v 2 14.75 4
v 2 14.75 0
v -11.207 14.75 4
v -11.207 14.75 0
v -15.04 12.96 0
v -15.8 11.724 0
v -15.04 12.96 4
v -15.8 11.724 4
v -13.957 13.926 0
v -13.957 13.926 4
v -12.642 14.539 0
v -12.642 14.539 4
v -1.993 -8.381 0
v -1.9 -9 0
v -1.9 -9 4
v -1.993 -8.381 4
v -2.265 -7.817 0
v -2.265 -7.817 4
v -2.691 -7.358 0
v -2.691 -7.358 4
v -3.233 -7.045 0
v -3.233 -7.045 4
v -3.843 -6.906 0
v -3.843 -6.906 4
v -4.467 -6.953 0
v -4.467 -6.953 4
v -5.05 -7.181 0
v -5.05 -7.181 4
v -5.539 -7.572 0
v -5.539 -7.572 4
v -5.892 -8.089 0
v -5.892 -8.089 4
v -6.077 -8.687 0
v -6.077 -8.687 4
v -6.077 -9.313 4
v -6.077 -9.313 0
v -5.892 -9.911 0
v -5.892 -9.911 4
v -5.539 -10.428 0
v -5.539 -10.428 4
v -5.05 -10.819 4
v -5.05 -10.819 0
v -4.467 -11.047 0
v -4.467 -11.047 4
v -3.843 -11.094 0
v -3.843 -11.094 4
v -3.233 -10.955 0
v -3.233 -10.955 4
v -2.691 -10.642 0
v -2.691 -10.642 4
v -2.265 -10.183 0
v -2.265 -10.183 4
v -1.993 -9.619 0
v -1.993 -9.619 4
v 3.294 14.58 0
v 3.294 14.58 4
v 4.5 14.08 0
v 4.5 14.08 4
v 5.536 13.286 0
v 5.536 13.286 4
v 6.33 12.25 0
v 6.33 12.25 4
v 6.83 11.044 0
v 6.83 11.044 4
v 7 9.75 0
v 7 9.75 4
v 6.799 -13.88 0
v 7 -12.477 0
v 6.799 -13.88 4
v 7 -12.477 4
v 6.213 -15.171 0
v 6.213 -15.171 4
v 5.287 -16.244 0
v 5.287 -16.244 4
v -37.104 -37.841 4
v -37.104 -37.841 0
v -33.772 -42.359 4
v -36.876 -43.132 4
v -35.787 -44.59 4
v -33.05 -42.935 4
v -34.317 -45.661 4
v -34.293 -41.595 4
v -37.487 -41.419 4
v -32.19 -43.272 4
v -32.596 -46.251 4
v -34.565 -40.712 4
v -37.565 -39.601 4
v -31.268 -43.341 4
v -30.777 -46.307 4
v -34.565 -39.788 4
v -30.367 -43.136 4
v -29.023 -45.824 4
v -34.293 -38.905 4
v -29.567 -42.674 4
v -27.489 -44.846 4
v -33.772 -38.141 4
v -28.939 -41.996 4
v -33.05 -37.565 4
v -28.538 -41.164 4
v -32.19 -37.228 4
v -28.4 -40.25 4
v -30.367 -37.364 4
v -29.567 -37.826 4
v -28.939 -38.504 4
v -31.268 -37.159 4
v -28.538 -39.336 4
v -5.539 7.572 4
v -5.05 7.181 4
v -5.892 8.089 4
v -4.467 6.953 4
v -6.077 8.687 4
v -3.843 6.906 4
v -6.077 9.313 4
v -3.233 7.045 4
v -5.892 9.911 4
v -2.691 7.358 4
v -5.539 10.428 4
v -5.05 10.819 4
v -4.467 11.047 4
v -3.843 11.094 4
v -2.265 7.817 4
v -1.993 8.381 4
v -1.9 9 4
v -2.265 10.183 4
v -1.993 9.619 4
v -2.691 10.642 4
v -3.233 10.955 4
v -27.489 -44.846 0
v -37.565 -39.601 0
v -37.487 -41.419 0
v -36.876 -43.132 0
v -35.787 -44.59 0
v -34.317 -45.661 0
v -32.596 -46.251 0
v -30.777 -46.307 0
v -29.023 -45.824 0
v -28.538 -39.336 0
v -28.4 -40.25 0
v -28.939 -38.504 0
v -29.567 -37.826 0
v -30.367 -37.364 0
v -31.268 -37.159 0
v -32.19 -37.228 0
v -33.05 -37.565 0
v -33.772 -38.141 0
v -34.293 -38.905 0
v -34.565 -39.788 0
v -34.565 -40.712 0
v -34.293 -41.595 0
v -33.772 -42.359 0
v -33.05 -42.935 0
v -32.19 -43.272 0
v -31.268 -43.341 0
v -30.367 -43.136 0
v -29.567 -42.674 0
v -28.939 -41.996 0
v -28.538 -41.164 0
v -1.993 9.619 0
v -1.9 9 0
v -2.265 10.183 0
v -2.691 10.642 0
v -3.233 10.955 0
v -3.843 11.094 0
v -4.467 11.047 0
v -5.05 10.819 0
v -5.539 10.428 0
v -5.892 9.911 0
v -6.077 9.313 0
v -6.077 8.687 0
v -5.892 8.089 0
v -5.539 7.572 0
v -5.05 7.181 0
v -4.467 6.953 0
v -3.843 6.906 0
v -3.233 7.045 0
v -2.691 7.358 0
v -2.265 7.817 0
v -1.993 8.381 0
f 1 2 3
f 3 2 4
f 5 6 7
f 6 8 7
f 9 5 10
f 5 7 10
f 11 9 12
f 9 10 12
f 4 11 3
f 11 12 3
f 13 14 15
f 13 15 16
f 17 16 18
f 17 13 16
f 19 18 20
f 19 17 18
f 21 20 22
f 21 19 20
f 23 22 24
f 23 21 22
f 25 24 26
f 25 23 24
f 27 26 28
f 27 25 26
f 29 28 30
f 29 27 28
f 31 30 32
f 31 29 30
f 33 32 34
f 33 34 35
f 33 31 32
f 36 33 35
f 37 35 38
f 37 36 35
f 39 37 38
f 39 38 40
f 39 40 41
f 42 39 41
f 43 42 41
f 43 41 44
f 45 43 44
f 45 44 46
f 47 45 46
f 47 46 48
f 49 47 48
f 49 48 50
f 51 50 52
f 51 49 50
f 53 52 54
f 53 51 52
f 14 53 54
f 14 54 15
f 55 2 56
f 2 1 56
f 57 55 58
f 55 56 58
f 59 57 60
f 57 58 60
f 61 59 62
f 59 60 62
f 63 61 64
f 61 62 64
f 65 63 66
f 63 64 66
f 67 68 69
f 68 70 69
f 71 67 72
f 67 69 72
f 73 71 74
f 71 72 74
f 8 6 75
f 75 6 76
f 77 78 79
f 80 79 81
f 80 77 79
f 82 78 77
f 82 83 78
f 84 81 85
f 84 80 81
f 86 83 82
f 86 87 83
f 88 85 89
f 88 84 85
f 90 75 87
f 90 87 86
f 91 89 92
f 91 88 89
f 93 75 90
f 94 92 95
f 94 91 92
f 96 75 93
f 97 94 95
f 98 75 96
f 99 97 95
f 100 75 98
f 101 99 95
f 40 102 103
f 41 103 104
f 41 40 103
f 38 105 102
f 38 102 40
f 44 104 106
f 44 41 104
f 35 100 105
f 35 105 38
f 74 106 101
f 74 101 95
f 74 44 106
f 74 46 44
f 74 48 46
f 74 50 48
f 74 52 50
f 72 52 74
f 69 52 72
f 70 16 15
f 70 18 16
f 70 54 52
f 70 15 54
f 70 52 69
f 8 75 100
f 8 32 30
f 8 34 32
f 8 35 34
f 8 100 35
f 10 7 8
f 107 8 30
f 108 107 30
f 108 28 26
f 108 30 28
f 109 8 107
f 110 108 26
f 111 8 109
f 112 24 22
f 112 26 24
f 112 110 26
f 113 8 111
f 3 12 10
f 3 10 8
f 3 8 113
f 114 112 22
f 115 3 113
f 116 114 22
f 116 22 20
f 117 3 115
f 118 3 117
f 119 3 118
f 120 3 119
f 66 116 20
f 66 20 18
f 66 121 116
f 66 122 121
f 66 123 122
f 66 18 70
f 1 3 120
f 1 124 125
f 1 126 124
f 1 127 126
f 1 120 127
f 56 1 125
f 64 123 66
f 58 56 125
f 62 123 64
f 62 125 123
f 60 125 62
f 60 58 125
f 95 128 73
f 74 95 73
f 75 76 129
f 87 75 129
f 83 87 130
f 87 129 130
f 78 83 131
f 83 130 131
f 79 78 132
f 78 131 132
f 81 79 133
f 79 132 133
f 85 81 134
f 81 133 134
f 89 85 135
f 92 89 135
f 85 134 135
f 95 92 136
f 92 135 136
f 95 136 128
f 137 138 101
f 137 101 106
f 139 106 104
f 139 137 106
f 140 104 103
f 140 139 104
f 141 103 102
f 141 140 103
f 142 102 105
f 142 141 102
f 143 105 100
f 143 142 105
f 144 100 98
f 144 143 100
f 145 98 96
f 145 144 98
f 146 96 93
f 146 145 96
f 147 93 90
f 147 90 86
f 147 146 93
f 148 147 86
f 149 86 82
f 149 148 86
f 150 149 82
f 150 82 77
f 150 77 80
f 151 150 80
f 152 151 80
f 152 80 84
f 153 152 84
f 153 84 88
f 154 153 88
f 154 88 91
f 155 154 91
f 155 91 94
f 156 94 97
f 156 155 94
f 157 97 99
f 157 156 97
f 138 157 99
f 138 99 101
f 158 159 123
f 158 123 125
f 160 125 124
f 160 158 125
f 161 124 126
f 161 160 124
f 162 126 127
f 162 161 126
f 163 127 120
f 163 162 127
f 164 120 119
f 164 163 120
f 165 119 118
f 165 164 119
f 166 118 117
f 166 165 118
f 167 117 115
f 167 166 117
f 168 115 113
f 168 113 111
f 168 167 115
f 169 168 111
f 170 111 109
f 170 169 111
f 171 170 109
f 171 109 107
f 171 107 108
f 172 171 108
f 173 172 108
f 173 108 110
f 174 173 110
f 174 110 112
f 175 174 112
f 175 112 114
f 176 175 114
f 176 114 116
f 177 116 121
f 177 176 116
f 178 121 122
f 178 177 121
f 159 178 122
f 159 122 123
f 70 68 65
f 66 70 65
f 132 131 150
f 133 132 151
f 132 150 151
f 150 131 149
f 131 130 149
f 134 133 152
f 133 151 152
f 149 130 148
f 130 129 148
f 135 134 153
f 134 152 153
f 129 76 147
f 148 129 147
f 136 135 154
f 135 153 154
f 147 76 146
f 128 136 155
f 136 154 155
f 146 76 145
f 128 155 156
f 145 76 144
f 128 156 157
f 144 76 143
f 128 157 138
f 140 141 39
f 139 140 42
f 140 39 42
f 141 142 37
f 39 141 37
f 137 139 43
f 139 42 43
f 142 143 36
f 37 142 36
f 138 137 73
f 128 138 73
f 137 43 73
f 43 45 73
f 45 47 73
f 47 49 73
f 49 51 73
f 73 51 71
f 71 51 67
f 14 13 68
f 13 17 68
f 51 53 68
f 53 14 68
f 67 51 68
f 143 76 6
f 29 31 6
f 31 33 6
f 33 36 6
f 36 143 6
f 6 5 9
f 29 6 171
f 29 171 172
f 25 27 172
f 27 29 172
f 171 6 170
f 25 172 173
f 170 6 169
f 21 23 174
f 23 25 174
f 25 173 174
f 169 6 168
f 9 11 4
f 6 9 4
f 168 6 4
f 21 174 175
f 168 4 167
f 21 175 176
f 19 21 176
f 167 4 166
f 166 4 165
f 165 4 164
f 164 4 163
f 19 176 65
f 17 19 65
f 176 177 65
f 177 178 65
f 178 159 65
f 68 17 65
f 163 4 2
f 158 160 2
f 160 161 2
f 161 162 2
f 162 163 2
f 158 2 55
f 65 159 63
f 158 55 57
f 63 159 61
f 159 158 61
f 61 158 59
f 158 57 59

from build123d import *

# Parameters (mm, degrees)
SKETCH_2_R      = 2.1
SKETCH_2_R_2    = 3.1
EXTRUDE_1_DEPTH = 4
FILLET_1_R      = 5


with BuildPart() as part:
    # 草图2 → 凸台-拉伸1 (new body)
    with BuildSketch(Plane.XY):
        with BuildLine():
            Line((-14.5, 14.75), (-37.104267152, -37.841226517))
            ThreePointArc((-37.104267152, -37.841226517), (-35.091941928, -45.180309644), (-27.489316181, -44.846130471))
            Line((-27.489316181, -44.846130471), (7, -14.75))
            Line((7, -14.75), (7, 14.75))
            Line((7, 14.75), (-14.5, 14.75))
        make_face()
        with Locations((-4, 9)):
            Circle(SKETCH_2_R, mode=Mode.SUBTRACT)
        with Locations((-4, -9)):
            Circle(SKETCH_2_R, mode=Mode.SUBTRACT)
        with Locations((-31.5, -40.25)):
            Circle(SKETCH_2_R_2, mode=Mode.SUBTRACT)
    extrude(amount=EXTRUDE_1_DEPTH)

    # 圆角1
    fillet_1_edges = [part.edges().sort_by_distance(p)[0] for p in [
        (-14.5, 14.75, 2),
        (7, 14.75, 2),
        (7, -14.75, 2),
    ]]
    fillet(fillet_1_edges, radius=FILLET_1_R)


solid = part.part
